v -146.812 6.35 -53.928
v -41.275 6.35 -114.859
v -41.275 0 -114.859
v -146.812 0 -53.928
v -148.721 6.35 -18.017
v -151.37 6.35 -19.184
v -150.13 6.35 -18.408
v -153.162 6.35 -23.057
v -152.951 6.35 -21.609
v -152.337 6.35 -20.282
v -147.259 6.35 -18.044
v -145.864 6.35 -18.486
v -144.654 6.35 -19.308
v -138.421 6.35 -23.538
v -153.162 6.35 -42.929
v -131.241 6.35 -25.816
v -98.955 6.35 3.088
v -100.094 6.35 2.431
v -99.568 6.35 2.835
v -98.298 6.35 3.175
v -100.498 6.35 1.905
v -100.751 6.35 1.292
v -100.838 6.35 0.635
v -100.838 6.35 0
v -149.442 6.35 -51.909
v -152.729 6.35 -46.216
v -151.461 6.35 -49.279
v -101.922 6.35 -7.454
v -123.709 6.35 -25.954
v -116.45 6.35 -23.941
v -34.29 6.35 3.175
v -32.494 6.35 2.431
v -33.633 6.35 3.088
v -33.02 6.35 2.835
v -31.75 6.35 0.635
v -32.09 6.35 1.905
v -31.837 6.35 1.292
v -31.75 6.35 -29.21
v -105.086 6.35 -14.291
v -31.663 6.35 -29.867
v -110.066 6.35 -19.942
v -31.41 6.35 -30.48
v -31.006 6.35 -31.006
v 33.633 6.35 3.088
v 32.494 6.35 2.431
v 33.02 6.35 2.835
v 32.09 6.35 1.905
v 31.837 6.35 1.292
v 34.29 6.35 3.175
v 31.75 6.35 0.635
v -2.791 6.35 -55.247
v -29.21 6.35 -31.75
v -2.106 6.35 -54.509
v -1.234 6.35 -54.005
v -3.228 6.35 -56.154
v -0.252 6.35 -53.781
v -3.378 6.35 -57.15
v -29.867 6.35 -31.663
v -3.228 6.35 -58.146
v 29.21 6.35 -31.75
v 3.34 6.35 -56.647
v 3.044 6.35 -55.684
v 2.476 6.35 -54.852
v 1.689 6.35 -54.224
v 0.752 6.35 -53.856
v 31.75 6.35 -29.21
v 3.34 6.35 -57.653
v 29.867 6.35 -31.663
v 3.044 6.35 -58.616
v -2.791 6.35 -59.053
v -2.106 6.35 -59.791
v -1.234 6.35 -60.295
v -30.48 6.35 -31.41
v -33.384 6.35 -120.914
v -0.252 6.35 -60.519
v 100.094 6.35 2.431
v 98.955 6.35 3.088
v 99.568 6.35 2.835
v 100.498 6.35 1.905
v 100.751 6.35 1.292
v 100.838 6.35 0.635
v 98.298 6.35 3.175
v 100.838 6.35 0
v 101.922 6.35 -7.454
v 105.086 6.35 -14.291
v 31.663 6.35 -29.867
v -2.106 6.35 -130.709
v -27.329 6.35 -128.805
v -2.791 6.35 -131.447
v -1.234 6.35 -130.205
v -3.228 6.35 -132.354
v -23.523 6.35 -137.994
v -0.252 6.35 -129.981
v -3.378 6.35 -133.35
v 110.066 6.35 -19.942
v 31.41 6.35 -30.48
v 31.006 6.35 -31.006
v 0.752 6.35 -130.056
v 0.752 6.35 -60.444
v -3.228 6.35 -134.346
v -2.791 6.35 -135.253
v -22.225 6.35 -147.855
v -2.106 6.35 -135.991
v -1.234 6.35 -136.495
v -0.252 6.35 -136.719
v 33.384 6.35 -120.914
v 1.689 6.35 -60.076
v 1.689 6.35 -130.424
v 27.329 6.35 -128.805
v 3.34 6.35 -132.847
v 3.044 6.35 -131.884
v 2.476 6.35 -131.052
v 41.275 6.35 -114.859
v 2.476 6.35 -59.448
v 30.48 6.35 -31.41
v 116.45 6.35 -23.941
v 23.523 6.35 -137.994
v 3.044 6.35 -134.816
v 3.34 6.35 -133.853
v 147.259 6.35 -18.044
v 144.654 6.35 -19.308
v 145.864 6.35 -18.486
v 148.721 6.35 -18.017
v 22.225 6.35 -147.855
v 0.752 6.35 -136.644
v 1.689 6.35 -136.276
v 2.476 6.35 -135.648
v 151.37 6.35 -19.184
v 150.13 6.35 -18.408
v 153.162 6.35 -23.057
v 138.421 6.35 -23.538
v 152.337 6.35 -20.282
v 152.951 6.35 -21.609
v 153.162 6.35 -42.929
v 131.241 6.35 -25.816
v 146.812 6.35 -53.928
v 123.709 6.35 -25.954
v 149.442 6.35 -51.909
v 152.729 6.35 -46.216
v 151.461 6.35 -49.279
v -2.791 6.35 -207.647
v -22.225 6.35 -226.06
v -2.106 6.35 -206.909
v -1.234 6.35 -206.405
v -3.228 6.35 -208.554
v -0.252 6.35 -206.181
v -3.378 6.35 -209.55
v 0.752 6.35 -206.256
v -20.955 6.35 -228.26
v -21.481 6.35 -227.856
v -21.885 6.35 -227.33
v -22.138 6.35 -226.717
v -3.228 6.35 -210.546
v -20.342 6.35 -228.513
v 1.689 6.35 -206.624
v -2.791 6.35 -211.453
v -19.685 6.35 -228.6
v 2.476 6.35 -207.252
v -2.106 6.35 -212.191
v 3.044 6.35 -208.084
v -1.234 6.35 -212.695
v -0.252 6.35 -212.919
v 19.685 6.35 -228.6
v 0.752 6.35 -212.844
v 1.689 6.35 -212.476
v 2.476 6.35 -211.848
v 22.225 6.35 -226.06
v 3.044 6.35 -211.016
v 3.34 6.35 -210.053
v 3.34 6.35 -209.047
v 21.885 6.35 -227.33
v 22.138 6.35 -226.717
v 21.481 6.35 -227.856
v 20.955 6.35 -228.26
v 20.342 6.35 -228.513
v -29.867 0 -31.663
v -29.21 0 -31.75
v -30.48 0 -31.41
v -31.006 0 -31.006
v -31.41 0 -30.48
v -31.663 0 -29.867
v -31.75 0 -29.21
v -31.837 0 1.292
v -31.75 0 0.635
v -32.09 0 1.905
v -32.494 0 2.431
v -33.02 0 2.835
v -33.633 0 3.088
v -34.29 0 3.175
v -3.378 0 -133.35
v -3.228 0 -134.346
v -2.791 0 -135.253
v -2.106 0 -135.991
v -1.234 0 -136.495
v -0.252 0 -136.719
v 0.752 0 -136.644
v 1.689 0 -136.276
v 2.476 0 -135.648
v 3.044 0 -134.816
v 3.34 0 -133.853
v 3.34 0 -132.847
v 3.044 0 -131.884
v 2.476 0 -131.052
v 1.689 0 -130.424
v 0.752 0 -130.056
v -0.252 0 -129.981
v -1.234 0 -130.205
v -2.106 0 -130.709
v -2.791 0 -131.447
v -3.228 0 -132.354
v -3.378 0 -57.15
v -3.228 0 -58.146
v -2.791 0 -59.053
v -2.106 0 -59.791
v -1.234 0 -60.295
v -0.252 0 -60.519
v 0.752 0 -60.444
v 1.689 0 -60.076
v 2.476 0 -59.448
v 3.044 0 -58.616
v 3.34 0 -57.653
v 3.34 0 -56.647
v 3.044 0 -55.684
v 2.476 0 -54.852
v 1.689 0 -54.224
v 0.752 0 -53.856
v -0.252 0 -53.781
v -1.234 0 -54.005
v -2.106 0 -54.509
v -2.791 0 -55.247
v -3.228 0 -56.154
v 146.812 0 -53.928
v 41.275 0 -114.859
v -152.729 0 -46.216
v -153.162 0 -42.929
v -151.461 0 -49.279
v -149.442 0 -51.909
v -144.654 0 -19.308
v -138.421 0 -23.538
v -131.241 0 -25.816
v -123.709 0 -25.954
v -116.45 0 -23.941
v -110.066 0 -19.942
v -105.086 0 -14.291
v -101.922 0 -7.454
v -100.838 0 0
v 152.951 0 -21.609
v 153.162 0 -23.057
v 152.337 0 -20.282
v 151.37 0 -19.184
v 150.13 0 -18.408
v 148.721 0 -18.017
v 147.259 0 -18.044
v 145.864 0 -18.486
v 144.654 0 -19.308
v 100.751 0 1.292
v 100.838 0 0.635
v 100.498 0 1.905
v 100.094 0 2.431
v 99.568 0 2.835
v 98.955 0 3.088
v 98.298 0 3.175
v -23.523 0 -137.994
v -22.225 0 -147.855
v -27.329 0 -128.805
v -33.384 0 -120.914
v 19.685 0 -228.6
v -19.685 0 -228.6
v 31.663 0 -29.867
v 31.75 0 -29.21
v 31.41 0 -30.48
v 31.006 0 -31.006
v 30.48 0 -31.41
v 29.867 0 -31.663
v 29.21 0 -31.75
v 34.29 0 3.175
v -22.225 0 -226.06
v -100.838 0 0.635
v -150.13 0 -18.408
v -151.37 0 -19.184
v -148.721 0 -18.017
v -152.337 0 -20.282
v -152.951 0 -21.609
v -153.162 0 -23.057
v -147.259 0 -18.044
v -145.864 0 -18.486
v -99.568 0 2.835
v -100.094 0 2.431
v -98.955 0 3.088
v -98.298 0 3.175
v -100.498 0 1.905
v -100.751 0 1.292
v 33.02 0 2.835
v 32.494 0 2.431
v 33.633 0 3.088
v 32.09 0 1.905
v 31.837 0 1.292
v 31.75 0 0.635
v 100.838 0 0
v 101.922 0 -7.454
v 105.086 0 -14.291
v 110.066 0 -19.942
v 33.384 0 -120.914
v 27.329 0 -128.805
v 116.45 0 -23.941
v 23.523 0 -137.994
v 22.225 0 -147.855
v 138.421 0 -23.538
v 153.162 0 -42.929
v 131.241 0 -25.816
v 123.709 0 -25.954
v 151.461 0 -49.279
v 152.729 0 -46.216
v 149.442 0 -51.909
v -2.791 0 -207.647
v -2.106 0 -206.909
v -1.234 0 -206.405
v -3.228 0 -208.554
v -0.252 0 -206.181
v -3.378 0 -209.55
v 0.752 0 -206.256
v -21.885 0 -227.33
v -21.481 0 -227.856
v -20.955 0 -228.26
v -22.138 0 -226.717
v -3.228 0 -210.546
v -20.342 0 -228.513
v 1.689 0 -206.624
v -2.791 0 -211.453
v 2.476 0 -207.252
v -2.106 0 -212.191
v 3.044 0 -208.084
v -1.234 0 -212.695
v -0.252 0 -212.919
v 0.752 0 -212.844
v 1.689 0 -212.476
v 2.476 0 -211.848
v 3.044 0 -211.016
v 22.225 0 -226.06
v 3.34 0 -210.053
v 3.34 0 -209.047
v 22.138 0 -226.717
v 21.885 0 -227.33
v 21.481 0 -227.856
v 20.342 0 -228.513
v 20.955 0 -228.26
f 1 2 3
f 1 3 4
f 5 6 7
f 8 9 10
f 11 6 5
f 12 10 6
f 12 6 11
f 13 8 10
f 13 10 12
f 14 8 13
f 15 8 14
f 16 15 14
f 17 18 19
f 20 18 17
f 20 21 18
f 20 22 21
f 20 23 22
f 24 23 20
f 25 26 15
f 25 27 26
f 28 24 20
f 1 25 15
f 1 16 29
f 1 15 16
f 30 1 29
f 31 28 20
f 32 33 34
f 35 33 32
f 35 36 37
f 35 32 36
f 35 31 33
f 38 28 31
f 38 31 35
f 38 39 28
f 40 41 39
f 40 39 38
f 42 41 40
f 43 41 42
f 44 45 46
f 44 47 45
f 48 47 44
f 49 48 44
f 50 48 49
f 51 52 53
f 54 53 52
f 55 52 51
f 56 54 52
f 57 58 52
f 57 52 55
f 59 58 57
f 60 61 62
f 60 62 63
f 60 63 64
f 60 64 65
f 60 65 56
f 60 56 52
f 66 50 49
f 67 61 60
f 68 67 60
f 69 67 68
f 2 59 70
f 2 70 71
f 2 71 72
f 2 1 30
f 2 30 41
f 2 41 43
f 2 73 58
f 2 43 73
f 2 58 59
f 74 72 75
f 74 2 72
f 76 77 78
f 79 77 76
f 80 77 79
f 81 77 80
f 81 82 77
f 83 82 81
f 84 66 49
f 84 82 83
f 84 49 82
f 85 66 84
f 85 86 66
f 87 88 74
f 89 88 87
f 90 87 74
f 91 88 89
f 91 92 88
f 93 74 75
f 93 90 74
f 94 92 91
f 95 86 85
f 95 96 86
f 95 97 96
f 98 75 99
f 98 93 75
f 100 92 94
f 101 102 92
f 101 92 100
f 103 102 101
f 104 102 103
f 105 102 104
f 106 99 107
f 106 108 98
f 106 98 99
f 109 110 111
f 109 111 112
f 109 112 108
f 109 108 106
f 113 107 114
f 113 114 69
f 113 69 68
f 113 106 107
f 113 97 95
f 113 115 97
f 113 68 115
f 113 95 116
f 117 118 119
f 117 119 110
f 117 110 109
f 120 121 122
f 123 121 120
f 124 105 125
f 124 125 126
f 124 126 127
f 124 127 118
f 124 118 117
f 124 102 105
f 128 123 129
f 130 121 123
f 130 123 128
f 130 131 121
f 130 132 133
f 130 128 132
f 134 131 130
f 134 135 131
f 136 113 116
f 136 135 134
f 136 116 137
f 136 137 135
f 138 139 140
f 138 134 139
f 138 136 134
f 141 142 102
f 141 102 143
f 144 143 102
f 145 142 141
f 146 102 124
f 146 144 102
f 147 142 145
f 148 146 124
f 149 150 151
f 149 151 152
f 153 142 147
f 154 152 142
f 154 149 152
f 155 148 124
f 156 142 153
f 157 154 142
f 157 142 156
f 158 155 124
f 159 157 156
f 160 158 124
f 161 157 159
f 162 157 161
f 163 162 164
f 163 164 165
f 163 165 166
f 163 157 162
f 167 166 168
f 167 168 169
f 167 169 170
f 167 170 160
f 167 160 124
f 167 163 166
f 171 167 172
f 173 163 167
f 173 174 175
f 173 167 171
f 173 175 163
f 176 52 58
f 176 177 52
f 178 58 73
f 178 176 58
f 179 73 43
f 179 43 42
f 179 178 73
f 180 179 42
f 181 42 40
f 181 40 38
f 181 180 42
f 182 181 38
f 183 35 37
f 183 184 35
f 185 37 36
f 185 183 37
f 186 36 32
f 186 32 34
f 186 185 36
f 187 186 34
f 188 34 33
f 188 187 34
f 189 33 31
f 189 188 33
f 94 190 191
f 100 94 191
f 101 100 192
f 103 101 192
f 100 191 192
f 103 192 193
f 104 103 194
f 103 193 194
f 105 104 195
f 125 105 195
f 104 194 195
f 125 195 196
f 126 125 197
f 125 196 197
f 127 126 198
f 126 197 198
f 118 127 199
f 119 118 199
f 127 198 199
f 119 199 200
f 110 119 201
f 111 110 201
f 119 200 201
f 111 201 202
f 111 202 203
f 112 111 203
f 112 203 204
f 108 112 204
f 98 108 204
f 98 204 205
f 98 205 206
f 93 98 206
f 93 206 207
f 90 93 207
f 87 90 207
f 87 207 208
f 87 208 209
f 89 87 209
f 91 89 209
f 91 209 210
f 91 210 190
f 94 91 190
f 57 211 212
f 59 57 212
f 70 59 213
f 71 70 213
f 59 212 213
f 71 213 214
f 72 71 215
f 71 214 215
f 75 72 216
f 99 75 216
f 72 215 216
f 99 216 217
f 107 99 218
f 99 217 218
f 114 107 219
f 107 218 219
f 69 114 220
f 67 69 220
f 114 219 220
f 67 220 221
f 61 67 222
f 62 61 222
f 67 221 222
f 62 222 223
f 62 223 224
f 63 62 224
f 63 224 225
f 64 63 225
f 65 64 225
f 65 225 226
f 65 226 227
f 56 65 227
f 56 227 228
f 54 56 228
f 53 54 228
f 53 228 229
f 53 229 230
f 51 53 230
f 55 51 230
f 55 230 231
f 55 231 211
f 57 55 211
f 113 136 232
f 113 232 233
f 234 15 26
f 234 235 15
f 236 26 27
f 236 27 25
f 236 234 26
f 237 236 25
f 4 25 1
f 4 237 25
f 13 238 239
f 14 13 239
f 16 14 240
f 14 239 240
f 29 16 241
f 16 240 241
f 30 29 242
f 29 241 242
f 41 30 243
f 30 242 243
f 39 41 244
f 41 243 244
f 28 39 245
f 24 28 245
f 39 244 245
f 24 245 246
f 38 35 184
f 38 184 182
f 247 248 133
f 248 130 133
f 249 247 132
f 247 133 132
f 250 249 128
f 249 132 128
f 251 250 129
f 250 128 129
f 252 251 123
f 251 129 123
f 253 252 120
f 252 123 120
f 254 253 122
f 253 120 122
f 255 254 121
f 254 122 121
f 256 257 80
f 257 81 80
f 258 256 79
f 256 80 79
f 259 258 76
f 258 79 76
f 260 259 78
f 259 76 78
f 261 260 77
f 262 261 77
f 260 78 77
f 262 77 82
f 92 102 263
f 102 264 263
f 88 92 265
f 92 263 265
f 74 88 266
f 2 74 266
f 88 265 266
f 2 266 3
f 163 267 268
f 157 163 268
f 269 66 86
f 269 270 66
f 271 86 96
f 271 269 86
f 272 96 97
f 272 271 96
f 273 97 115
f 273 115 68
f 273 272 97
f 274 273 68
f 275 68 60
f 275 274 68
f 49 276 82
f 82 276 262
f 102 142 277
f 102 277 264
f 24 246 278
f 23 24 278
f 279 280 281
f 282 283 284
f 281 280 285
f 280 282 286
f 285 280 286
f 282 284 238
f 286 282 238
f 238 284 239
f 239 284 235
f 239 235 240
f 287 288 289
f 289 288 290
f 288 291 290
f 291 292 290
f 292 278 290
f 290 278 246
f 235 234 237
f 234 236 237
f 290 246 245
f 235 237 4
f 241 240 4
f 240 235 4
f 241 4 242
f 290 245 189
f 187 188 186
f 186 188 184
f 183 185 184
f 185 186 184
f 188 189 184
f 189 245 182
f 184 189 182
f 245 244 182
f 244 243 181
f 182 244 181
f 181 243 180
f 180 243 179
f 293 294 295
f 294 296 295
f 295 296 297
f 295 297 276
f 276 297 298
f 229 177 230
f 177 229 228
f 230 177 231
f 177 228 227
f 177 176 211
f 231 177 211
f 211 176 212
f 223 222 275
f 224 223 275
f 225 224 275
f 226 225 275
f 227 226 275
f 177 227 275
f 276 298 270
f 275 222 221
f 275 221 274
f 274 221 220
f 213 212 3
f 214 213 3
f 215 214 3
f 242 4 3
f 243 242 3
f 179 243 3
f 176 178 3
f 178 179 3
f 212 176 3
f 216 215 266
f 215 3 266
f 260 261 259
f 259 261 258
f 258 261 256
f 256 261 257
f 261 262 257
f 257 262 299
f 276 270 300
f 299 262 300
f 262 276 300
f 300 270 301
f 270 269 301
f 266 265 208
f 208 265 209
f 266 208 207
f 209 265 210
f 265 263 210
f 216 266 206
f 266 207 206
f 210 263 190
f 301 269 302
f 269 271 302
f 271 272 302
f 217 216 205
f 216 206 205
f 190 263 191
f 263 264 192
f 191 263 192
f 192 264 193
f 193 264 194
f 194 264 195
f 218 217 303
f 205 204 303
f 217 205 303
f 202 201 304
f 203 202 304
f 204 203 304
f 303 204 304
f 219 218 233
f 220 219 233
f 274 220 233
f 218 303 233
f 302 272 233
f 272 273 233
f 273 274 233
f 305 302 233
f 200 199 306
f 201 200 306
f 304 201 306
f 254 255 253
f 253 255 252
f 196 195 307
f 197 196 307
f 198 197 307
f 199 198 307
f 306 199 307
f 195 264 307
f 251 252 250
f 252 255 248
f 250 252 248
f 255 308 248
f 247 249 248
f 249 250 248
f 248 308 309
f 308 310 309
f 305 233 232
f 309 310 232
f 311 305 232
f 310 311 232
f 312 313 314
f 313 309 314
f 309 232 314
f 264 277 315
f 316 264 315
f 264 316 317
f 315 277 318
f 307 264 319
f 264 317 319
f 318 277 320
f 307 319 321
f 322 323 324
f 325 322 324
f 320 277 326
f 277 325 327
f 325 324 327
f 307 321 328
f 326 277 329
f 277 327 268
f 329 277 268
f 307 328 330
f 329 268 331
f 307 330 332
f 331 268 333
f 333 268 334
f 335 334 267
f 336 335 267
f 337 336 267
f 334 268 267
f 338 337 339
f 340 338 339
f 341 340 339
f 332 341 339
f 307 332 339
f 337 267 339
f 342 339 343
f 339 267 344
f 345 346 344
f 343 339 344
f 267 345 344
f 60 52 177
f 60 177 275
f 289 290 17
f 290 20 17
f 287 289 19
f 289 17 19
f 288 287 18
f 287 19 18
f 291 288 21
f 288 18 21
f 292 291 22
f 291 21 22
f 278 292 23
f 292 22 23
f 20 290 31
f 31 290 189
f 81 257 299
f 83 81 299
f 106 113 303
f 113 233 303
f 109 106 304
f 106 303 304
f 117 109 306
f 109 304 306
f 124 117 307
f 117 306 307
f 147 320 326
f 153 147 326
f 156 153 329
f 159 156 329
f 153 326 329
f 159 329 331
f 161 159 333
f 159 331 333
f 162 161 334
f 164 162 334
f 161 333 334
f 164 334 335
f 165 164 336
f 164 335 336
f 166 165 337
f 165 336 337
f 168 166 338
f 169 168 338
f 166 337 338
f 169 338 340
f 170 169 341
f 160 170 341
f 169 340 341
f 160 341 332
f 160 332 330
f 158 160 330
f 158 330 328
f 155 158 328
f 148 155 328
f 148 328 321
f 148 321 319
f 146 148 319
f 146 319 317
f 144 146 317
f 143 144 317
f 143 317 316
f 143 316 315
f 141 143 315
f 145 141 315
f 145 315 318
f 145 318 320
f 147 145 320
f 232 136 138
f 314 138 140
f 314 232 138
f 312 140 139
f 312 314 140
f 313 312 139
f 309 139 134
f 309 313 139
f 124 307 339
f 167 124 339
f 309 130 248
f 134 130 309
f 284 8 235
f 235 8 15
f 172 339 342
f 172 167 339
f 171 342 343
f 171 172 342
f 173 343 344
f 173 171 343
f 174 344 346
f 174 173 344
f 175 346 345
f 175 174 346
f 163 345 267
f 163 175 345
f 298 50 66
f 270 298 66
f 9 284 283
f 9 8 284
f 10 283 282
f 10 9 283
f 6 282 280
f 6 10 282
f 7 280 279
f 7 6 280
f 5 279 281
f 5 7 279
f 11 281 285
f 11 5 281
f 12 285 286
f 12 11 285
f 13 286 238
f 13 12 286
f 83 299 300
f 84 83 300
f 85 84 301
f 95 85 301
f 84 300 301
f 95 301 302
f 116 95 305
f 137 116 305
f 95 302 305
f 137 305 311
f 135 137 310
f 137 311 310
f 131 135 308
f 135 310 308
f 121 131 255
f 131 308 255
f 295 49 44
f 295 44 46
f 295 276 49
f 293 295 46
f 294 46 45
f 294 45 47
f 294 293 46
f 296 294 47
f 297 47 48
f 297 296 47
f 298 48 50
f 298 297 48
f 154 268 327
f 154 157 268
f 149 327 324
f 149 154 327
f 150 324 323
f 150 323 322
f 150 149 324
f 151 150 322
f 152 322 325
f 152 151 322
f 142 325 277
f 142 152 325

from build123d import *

# Parameters (mm, degrees)
BOSS_EXTRUDE1_DEPTH     = 6.35
SKETCH2_W               = 63.5
SKETCH2_H               = 34.925
CUT_EXTRUDE1_DEPTH      = 299.126542166
F_1_4_CLEARANCE_HOLE1_D = 6.7564
CUT_EXTRUDE2_DEPTH      = 299.126542166
FILLET1_R               = 25.4
FILLET2_R               = 5.08
FILLET3_R               = 2.54
CUT_EXTRUDE4_DEPTH      = 276.239678724
FILLET5_R               = 12.7
FILLET6_R               = 38.1


with BuildPart() as part:
    # Sketch1 → Boss-Extrude1 (new body)
    with BuildSketch(Plane(origin=(0, 0, 0), x_dir=(1, 0, 0), z_dir=(0, 1, 0))):
        with BuildLine():
            Line((22.225, 228.6), (-22.225, 228.6))
            Line((-22.225, 228.6), (-22.225, 190.5))
            ThreePointArc((-22.225, 190.5), (-25.761770597, 174.46899338), (-35.715455289, 161.414259351))
            Line((-35.715455289, 161.414259351), (-168.508098746, 49.057949228))
            ThreePointArc((-168.508098746, 49.057949228), (-185.296646926, 27.038964499), (-191.262, 0))
            Line((-191.262, 0), (-191.262, -3.175))
            Line((-191.262, -3.175), (-153.162, -3.175))
            Line((-153.162, -3.175), (-153.162, 0))
            ThreePointArc((-153.162, 0), (-127, 26.162), (-100.838, 0))
            Line((-100.838, 0), (-100.838, -3.175))
            Line((-100.838, -3.175), (100.838, -3.175))
            Line((100.838, -3.175), (100.838, 0))
            ThreePointArc((100.838, 0), (127, 26.162), (153.162, 0))
            Line((153.162, 0), (153.162, -3.175))
            Line((153.162, -3.175), (191.262, -3.175))
            Line((191.262, -3.175), (191.262, 0))
            ThreePointArc((191.262, 0), (185.296646926, 27.038964499), (168.508098746, 49.057949228))
            Line((168.508098746, 49.057949228), (35.715455289, 161.414259351))
            ThreePointArc((35.715455289, 161.414259351), (25.761770597, 174.46899338), (22.225, 190.5))
            Line((22.225, 190.5), (22.225, 228.6))
        make_face()
    extrude(amount=BOSS_EXTRUDE1_DEPTH)

    # Sketch2 → Cut-Extrude1 (cut, through all)
    with BuildSketch(Plane(origin=(0, 6.35, 0), x_dir=(1, 0, 0), z_dir=(0, 1, 0))):
        with Locations((0, 14.2875)):
            Rectangle(SKETCH2_W, SKETCH2_H)
    extrude(amount=-CUT_EXTRUDE1_DEPTH, mode=Mode.SUBTRACT)

    # 1/4 Clearance Hole1 (through all)
    with Locations(Plane(origin=(0, 6.35, 0), x_dir=(1, 0, 0), z_dir=(0, 1, 0))):
        with Locations((0, 209.55), (0, 133.35), (0, 57.15)):
            Hole(F_1_4_CLEARANCE_HOLE1_D / 2)

    # Sketch5 → Cut-Extrude2 (cut, through all)
    with BuildSketch(Plane(origin=(0, 6.35, 0), x_dir=(1, 0, 0), z_dir=(0, 1, 0))):
        with BuildLine():
            Line((-153.162, -3.175), (-153.162, 62.042335901))
            Line((-153.162, 62.042335901), (-168.508098746, 49.057949228))
            ThreePointArc((-168.508098746, 49.057949228), (-185.296646926, 27.038964499), (-191.262, 0))
            Line((-191.262, 0), (-191.262, -3.175))
            Line((-191.262, -3.175), (-153.162, -3.175))
        make_face()
        with BuildLine():
            Line((191.262, 0), (191.262, -3.175))
            Line((191.262, -3.175), (153.162, -3.175))
            Line((153.162, -3.175), (153.162, 62.042335901))
            Line((153.162, 62.042335901), (168.508098746, 49.057949228))
            ThreePointArc((168.508098746, 49.057949228), (185.296646926, 27.038964499), (191.262, 0))
        make_face()
    extrude(amount=-CUT_EXTRUDE2_DEPTH, mode=Mode.SUBTRACT)

    # Fillet1
    fillet1_edges = [part.edges().sort_by_distance(p)[0] for p in [
        (153.162, 3.175, -62.042335901),
        (-153.162, 3.175, -62.042335901),
    ]]
    fillet(fillet1_edges, radius=FILLET1_R)

    # Fillet2
    fillet2_edges = [part.edges().sort_by_distance(p)[0] for p in [
        (153.162, 3.175, 0),
        (-153.162, 3.175, 0),
    ]]
    fillet(fillet2_edges, radius=FILLET2_R)

    # Fillet3
    fillet3_edges = [part.edges().sort_by_distance(p)[0] for p in [
        (-22.225, 3.175, -228.6),
        (22.225, 3.175, -228.6),
        (100.838, 3.175, 3.175),
        (-100.838, 3.175, 3.175),
        (31.75, 3.175, 3.175),
        (-31.75, 3.175, 3.175),
        (-31.75, 3.175, -31.75),
        (31.75, 3.175, -31.75),
    ]]
    fillet(fillet3_edges, radius=FILLET3_R)

    # Sketch7 → Cut-Extrude4 (cut, through all)
    with BuildSketch(Plane(origin=(0, 6.35, 0), x_dir=(1, 0, 0), z_dir=(0, 1, 0))):
        Polygon((-22.225, 125.857901259), (-153.162, 50.261389063), (-153.162, 60.856337773), (-22.225, 190.5), align=None)
        Polygon((153.162, 60.856337773), (153.162, 50.261389063), (22.225, 125.857901259), (22.225, 190.5), align=None)
    extrude(amount=-CUT_EXTRUDE4_DEPTH, mode=Mode.SUBTRACT)

    # Fillet5
    fillet5_edges = [part.edges().sort_by_distance(p)[0] for p in [
        (153.162, 3.175, -50.261389063),
        (-153.162, 3.175, -50.261389063),
    ]]
    fillet(fillet5_edges, radius=FILLET5_R)

    # Fillet6
    fillet6_edges = [part.edges().sort_by_distance(p)[0] for p in [
        (-22.225, 3.175, -125.857901259),
        (22.225, 3.175, -125.857901259),
    ]]
    fillet(fillet6_edges, radius=FILLET6_R)


solid = part.part
